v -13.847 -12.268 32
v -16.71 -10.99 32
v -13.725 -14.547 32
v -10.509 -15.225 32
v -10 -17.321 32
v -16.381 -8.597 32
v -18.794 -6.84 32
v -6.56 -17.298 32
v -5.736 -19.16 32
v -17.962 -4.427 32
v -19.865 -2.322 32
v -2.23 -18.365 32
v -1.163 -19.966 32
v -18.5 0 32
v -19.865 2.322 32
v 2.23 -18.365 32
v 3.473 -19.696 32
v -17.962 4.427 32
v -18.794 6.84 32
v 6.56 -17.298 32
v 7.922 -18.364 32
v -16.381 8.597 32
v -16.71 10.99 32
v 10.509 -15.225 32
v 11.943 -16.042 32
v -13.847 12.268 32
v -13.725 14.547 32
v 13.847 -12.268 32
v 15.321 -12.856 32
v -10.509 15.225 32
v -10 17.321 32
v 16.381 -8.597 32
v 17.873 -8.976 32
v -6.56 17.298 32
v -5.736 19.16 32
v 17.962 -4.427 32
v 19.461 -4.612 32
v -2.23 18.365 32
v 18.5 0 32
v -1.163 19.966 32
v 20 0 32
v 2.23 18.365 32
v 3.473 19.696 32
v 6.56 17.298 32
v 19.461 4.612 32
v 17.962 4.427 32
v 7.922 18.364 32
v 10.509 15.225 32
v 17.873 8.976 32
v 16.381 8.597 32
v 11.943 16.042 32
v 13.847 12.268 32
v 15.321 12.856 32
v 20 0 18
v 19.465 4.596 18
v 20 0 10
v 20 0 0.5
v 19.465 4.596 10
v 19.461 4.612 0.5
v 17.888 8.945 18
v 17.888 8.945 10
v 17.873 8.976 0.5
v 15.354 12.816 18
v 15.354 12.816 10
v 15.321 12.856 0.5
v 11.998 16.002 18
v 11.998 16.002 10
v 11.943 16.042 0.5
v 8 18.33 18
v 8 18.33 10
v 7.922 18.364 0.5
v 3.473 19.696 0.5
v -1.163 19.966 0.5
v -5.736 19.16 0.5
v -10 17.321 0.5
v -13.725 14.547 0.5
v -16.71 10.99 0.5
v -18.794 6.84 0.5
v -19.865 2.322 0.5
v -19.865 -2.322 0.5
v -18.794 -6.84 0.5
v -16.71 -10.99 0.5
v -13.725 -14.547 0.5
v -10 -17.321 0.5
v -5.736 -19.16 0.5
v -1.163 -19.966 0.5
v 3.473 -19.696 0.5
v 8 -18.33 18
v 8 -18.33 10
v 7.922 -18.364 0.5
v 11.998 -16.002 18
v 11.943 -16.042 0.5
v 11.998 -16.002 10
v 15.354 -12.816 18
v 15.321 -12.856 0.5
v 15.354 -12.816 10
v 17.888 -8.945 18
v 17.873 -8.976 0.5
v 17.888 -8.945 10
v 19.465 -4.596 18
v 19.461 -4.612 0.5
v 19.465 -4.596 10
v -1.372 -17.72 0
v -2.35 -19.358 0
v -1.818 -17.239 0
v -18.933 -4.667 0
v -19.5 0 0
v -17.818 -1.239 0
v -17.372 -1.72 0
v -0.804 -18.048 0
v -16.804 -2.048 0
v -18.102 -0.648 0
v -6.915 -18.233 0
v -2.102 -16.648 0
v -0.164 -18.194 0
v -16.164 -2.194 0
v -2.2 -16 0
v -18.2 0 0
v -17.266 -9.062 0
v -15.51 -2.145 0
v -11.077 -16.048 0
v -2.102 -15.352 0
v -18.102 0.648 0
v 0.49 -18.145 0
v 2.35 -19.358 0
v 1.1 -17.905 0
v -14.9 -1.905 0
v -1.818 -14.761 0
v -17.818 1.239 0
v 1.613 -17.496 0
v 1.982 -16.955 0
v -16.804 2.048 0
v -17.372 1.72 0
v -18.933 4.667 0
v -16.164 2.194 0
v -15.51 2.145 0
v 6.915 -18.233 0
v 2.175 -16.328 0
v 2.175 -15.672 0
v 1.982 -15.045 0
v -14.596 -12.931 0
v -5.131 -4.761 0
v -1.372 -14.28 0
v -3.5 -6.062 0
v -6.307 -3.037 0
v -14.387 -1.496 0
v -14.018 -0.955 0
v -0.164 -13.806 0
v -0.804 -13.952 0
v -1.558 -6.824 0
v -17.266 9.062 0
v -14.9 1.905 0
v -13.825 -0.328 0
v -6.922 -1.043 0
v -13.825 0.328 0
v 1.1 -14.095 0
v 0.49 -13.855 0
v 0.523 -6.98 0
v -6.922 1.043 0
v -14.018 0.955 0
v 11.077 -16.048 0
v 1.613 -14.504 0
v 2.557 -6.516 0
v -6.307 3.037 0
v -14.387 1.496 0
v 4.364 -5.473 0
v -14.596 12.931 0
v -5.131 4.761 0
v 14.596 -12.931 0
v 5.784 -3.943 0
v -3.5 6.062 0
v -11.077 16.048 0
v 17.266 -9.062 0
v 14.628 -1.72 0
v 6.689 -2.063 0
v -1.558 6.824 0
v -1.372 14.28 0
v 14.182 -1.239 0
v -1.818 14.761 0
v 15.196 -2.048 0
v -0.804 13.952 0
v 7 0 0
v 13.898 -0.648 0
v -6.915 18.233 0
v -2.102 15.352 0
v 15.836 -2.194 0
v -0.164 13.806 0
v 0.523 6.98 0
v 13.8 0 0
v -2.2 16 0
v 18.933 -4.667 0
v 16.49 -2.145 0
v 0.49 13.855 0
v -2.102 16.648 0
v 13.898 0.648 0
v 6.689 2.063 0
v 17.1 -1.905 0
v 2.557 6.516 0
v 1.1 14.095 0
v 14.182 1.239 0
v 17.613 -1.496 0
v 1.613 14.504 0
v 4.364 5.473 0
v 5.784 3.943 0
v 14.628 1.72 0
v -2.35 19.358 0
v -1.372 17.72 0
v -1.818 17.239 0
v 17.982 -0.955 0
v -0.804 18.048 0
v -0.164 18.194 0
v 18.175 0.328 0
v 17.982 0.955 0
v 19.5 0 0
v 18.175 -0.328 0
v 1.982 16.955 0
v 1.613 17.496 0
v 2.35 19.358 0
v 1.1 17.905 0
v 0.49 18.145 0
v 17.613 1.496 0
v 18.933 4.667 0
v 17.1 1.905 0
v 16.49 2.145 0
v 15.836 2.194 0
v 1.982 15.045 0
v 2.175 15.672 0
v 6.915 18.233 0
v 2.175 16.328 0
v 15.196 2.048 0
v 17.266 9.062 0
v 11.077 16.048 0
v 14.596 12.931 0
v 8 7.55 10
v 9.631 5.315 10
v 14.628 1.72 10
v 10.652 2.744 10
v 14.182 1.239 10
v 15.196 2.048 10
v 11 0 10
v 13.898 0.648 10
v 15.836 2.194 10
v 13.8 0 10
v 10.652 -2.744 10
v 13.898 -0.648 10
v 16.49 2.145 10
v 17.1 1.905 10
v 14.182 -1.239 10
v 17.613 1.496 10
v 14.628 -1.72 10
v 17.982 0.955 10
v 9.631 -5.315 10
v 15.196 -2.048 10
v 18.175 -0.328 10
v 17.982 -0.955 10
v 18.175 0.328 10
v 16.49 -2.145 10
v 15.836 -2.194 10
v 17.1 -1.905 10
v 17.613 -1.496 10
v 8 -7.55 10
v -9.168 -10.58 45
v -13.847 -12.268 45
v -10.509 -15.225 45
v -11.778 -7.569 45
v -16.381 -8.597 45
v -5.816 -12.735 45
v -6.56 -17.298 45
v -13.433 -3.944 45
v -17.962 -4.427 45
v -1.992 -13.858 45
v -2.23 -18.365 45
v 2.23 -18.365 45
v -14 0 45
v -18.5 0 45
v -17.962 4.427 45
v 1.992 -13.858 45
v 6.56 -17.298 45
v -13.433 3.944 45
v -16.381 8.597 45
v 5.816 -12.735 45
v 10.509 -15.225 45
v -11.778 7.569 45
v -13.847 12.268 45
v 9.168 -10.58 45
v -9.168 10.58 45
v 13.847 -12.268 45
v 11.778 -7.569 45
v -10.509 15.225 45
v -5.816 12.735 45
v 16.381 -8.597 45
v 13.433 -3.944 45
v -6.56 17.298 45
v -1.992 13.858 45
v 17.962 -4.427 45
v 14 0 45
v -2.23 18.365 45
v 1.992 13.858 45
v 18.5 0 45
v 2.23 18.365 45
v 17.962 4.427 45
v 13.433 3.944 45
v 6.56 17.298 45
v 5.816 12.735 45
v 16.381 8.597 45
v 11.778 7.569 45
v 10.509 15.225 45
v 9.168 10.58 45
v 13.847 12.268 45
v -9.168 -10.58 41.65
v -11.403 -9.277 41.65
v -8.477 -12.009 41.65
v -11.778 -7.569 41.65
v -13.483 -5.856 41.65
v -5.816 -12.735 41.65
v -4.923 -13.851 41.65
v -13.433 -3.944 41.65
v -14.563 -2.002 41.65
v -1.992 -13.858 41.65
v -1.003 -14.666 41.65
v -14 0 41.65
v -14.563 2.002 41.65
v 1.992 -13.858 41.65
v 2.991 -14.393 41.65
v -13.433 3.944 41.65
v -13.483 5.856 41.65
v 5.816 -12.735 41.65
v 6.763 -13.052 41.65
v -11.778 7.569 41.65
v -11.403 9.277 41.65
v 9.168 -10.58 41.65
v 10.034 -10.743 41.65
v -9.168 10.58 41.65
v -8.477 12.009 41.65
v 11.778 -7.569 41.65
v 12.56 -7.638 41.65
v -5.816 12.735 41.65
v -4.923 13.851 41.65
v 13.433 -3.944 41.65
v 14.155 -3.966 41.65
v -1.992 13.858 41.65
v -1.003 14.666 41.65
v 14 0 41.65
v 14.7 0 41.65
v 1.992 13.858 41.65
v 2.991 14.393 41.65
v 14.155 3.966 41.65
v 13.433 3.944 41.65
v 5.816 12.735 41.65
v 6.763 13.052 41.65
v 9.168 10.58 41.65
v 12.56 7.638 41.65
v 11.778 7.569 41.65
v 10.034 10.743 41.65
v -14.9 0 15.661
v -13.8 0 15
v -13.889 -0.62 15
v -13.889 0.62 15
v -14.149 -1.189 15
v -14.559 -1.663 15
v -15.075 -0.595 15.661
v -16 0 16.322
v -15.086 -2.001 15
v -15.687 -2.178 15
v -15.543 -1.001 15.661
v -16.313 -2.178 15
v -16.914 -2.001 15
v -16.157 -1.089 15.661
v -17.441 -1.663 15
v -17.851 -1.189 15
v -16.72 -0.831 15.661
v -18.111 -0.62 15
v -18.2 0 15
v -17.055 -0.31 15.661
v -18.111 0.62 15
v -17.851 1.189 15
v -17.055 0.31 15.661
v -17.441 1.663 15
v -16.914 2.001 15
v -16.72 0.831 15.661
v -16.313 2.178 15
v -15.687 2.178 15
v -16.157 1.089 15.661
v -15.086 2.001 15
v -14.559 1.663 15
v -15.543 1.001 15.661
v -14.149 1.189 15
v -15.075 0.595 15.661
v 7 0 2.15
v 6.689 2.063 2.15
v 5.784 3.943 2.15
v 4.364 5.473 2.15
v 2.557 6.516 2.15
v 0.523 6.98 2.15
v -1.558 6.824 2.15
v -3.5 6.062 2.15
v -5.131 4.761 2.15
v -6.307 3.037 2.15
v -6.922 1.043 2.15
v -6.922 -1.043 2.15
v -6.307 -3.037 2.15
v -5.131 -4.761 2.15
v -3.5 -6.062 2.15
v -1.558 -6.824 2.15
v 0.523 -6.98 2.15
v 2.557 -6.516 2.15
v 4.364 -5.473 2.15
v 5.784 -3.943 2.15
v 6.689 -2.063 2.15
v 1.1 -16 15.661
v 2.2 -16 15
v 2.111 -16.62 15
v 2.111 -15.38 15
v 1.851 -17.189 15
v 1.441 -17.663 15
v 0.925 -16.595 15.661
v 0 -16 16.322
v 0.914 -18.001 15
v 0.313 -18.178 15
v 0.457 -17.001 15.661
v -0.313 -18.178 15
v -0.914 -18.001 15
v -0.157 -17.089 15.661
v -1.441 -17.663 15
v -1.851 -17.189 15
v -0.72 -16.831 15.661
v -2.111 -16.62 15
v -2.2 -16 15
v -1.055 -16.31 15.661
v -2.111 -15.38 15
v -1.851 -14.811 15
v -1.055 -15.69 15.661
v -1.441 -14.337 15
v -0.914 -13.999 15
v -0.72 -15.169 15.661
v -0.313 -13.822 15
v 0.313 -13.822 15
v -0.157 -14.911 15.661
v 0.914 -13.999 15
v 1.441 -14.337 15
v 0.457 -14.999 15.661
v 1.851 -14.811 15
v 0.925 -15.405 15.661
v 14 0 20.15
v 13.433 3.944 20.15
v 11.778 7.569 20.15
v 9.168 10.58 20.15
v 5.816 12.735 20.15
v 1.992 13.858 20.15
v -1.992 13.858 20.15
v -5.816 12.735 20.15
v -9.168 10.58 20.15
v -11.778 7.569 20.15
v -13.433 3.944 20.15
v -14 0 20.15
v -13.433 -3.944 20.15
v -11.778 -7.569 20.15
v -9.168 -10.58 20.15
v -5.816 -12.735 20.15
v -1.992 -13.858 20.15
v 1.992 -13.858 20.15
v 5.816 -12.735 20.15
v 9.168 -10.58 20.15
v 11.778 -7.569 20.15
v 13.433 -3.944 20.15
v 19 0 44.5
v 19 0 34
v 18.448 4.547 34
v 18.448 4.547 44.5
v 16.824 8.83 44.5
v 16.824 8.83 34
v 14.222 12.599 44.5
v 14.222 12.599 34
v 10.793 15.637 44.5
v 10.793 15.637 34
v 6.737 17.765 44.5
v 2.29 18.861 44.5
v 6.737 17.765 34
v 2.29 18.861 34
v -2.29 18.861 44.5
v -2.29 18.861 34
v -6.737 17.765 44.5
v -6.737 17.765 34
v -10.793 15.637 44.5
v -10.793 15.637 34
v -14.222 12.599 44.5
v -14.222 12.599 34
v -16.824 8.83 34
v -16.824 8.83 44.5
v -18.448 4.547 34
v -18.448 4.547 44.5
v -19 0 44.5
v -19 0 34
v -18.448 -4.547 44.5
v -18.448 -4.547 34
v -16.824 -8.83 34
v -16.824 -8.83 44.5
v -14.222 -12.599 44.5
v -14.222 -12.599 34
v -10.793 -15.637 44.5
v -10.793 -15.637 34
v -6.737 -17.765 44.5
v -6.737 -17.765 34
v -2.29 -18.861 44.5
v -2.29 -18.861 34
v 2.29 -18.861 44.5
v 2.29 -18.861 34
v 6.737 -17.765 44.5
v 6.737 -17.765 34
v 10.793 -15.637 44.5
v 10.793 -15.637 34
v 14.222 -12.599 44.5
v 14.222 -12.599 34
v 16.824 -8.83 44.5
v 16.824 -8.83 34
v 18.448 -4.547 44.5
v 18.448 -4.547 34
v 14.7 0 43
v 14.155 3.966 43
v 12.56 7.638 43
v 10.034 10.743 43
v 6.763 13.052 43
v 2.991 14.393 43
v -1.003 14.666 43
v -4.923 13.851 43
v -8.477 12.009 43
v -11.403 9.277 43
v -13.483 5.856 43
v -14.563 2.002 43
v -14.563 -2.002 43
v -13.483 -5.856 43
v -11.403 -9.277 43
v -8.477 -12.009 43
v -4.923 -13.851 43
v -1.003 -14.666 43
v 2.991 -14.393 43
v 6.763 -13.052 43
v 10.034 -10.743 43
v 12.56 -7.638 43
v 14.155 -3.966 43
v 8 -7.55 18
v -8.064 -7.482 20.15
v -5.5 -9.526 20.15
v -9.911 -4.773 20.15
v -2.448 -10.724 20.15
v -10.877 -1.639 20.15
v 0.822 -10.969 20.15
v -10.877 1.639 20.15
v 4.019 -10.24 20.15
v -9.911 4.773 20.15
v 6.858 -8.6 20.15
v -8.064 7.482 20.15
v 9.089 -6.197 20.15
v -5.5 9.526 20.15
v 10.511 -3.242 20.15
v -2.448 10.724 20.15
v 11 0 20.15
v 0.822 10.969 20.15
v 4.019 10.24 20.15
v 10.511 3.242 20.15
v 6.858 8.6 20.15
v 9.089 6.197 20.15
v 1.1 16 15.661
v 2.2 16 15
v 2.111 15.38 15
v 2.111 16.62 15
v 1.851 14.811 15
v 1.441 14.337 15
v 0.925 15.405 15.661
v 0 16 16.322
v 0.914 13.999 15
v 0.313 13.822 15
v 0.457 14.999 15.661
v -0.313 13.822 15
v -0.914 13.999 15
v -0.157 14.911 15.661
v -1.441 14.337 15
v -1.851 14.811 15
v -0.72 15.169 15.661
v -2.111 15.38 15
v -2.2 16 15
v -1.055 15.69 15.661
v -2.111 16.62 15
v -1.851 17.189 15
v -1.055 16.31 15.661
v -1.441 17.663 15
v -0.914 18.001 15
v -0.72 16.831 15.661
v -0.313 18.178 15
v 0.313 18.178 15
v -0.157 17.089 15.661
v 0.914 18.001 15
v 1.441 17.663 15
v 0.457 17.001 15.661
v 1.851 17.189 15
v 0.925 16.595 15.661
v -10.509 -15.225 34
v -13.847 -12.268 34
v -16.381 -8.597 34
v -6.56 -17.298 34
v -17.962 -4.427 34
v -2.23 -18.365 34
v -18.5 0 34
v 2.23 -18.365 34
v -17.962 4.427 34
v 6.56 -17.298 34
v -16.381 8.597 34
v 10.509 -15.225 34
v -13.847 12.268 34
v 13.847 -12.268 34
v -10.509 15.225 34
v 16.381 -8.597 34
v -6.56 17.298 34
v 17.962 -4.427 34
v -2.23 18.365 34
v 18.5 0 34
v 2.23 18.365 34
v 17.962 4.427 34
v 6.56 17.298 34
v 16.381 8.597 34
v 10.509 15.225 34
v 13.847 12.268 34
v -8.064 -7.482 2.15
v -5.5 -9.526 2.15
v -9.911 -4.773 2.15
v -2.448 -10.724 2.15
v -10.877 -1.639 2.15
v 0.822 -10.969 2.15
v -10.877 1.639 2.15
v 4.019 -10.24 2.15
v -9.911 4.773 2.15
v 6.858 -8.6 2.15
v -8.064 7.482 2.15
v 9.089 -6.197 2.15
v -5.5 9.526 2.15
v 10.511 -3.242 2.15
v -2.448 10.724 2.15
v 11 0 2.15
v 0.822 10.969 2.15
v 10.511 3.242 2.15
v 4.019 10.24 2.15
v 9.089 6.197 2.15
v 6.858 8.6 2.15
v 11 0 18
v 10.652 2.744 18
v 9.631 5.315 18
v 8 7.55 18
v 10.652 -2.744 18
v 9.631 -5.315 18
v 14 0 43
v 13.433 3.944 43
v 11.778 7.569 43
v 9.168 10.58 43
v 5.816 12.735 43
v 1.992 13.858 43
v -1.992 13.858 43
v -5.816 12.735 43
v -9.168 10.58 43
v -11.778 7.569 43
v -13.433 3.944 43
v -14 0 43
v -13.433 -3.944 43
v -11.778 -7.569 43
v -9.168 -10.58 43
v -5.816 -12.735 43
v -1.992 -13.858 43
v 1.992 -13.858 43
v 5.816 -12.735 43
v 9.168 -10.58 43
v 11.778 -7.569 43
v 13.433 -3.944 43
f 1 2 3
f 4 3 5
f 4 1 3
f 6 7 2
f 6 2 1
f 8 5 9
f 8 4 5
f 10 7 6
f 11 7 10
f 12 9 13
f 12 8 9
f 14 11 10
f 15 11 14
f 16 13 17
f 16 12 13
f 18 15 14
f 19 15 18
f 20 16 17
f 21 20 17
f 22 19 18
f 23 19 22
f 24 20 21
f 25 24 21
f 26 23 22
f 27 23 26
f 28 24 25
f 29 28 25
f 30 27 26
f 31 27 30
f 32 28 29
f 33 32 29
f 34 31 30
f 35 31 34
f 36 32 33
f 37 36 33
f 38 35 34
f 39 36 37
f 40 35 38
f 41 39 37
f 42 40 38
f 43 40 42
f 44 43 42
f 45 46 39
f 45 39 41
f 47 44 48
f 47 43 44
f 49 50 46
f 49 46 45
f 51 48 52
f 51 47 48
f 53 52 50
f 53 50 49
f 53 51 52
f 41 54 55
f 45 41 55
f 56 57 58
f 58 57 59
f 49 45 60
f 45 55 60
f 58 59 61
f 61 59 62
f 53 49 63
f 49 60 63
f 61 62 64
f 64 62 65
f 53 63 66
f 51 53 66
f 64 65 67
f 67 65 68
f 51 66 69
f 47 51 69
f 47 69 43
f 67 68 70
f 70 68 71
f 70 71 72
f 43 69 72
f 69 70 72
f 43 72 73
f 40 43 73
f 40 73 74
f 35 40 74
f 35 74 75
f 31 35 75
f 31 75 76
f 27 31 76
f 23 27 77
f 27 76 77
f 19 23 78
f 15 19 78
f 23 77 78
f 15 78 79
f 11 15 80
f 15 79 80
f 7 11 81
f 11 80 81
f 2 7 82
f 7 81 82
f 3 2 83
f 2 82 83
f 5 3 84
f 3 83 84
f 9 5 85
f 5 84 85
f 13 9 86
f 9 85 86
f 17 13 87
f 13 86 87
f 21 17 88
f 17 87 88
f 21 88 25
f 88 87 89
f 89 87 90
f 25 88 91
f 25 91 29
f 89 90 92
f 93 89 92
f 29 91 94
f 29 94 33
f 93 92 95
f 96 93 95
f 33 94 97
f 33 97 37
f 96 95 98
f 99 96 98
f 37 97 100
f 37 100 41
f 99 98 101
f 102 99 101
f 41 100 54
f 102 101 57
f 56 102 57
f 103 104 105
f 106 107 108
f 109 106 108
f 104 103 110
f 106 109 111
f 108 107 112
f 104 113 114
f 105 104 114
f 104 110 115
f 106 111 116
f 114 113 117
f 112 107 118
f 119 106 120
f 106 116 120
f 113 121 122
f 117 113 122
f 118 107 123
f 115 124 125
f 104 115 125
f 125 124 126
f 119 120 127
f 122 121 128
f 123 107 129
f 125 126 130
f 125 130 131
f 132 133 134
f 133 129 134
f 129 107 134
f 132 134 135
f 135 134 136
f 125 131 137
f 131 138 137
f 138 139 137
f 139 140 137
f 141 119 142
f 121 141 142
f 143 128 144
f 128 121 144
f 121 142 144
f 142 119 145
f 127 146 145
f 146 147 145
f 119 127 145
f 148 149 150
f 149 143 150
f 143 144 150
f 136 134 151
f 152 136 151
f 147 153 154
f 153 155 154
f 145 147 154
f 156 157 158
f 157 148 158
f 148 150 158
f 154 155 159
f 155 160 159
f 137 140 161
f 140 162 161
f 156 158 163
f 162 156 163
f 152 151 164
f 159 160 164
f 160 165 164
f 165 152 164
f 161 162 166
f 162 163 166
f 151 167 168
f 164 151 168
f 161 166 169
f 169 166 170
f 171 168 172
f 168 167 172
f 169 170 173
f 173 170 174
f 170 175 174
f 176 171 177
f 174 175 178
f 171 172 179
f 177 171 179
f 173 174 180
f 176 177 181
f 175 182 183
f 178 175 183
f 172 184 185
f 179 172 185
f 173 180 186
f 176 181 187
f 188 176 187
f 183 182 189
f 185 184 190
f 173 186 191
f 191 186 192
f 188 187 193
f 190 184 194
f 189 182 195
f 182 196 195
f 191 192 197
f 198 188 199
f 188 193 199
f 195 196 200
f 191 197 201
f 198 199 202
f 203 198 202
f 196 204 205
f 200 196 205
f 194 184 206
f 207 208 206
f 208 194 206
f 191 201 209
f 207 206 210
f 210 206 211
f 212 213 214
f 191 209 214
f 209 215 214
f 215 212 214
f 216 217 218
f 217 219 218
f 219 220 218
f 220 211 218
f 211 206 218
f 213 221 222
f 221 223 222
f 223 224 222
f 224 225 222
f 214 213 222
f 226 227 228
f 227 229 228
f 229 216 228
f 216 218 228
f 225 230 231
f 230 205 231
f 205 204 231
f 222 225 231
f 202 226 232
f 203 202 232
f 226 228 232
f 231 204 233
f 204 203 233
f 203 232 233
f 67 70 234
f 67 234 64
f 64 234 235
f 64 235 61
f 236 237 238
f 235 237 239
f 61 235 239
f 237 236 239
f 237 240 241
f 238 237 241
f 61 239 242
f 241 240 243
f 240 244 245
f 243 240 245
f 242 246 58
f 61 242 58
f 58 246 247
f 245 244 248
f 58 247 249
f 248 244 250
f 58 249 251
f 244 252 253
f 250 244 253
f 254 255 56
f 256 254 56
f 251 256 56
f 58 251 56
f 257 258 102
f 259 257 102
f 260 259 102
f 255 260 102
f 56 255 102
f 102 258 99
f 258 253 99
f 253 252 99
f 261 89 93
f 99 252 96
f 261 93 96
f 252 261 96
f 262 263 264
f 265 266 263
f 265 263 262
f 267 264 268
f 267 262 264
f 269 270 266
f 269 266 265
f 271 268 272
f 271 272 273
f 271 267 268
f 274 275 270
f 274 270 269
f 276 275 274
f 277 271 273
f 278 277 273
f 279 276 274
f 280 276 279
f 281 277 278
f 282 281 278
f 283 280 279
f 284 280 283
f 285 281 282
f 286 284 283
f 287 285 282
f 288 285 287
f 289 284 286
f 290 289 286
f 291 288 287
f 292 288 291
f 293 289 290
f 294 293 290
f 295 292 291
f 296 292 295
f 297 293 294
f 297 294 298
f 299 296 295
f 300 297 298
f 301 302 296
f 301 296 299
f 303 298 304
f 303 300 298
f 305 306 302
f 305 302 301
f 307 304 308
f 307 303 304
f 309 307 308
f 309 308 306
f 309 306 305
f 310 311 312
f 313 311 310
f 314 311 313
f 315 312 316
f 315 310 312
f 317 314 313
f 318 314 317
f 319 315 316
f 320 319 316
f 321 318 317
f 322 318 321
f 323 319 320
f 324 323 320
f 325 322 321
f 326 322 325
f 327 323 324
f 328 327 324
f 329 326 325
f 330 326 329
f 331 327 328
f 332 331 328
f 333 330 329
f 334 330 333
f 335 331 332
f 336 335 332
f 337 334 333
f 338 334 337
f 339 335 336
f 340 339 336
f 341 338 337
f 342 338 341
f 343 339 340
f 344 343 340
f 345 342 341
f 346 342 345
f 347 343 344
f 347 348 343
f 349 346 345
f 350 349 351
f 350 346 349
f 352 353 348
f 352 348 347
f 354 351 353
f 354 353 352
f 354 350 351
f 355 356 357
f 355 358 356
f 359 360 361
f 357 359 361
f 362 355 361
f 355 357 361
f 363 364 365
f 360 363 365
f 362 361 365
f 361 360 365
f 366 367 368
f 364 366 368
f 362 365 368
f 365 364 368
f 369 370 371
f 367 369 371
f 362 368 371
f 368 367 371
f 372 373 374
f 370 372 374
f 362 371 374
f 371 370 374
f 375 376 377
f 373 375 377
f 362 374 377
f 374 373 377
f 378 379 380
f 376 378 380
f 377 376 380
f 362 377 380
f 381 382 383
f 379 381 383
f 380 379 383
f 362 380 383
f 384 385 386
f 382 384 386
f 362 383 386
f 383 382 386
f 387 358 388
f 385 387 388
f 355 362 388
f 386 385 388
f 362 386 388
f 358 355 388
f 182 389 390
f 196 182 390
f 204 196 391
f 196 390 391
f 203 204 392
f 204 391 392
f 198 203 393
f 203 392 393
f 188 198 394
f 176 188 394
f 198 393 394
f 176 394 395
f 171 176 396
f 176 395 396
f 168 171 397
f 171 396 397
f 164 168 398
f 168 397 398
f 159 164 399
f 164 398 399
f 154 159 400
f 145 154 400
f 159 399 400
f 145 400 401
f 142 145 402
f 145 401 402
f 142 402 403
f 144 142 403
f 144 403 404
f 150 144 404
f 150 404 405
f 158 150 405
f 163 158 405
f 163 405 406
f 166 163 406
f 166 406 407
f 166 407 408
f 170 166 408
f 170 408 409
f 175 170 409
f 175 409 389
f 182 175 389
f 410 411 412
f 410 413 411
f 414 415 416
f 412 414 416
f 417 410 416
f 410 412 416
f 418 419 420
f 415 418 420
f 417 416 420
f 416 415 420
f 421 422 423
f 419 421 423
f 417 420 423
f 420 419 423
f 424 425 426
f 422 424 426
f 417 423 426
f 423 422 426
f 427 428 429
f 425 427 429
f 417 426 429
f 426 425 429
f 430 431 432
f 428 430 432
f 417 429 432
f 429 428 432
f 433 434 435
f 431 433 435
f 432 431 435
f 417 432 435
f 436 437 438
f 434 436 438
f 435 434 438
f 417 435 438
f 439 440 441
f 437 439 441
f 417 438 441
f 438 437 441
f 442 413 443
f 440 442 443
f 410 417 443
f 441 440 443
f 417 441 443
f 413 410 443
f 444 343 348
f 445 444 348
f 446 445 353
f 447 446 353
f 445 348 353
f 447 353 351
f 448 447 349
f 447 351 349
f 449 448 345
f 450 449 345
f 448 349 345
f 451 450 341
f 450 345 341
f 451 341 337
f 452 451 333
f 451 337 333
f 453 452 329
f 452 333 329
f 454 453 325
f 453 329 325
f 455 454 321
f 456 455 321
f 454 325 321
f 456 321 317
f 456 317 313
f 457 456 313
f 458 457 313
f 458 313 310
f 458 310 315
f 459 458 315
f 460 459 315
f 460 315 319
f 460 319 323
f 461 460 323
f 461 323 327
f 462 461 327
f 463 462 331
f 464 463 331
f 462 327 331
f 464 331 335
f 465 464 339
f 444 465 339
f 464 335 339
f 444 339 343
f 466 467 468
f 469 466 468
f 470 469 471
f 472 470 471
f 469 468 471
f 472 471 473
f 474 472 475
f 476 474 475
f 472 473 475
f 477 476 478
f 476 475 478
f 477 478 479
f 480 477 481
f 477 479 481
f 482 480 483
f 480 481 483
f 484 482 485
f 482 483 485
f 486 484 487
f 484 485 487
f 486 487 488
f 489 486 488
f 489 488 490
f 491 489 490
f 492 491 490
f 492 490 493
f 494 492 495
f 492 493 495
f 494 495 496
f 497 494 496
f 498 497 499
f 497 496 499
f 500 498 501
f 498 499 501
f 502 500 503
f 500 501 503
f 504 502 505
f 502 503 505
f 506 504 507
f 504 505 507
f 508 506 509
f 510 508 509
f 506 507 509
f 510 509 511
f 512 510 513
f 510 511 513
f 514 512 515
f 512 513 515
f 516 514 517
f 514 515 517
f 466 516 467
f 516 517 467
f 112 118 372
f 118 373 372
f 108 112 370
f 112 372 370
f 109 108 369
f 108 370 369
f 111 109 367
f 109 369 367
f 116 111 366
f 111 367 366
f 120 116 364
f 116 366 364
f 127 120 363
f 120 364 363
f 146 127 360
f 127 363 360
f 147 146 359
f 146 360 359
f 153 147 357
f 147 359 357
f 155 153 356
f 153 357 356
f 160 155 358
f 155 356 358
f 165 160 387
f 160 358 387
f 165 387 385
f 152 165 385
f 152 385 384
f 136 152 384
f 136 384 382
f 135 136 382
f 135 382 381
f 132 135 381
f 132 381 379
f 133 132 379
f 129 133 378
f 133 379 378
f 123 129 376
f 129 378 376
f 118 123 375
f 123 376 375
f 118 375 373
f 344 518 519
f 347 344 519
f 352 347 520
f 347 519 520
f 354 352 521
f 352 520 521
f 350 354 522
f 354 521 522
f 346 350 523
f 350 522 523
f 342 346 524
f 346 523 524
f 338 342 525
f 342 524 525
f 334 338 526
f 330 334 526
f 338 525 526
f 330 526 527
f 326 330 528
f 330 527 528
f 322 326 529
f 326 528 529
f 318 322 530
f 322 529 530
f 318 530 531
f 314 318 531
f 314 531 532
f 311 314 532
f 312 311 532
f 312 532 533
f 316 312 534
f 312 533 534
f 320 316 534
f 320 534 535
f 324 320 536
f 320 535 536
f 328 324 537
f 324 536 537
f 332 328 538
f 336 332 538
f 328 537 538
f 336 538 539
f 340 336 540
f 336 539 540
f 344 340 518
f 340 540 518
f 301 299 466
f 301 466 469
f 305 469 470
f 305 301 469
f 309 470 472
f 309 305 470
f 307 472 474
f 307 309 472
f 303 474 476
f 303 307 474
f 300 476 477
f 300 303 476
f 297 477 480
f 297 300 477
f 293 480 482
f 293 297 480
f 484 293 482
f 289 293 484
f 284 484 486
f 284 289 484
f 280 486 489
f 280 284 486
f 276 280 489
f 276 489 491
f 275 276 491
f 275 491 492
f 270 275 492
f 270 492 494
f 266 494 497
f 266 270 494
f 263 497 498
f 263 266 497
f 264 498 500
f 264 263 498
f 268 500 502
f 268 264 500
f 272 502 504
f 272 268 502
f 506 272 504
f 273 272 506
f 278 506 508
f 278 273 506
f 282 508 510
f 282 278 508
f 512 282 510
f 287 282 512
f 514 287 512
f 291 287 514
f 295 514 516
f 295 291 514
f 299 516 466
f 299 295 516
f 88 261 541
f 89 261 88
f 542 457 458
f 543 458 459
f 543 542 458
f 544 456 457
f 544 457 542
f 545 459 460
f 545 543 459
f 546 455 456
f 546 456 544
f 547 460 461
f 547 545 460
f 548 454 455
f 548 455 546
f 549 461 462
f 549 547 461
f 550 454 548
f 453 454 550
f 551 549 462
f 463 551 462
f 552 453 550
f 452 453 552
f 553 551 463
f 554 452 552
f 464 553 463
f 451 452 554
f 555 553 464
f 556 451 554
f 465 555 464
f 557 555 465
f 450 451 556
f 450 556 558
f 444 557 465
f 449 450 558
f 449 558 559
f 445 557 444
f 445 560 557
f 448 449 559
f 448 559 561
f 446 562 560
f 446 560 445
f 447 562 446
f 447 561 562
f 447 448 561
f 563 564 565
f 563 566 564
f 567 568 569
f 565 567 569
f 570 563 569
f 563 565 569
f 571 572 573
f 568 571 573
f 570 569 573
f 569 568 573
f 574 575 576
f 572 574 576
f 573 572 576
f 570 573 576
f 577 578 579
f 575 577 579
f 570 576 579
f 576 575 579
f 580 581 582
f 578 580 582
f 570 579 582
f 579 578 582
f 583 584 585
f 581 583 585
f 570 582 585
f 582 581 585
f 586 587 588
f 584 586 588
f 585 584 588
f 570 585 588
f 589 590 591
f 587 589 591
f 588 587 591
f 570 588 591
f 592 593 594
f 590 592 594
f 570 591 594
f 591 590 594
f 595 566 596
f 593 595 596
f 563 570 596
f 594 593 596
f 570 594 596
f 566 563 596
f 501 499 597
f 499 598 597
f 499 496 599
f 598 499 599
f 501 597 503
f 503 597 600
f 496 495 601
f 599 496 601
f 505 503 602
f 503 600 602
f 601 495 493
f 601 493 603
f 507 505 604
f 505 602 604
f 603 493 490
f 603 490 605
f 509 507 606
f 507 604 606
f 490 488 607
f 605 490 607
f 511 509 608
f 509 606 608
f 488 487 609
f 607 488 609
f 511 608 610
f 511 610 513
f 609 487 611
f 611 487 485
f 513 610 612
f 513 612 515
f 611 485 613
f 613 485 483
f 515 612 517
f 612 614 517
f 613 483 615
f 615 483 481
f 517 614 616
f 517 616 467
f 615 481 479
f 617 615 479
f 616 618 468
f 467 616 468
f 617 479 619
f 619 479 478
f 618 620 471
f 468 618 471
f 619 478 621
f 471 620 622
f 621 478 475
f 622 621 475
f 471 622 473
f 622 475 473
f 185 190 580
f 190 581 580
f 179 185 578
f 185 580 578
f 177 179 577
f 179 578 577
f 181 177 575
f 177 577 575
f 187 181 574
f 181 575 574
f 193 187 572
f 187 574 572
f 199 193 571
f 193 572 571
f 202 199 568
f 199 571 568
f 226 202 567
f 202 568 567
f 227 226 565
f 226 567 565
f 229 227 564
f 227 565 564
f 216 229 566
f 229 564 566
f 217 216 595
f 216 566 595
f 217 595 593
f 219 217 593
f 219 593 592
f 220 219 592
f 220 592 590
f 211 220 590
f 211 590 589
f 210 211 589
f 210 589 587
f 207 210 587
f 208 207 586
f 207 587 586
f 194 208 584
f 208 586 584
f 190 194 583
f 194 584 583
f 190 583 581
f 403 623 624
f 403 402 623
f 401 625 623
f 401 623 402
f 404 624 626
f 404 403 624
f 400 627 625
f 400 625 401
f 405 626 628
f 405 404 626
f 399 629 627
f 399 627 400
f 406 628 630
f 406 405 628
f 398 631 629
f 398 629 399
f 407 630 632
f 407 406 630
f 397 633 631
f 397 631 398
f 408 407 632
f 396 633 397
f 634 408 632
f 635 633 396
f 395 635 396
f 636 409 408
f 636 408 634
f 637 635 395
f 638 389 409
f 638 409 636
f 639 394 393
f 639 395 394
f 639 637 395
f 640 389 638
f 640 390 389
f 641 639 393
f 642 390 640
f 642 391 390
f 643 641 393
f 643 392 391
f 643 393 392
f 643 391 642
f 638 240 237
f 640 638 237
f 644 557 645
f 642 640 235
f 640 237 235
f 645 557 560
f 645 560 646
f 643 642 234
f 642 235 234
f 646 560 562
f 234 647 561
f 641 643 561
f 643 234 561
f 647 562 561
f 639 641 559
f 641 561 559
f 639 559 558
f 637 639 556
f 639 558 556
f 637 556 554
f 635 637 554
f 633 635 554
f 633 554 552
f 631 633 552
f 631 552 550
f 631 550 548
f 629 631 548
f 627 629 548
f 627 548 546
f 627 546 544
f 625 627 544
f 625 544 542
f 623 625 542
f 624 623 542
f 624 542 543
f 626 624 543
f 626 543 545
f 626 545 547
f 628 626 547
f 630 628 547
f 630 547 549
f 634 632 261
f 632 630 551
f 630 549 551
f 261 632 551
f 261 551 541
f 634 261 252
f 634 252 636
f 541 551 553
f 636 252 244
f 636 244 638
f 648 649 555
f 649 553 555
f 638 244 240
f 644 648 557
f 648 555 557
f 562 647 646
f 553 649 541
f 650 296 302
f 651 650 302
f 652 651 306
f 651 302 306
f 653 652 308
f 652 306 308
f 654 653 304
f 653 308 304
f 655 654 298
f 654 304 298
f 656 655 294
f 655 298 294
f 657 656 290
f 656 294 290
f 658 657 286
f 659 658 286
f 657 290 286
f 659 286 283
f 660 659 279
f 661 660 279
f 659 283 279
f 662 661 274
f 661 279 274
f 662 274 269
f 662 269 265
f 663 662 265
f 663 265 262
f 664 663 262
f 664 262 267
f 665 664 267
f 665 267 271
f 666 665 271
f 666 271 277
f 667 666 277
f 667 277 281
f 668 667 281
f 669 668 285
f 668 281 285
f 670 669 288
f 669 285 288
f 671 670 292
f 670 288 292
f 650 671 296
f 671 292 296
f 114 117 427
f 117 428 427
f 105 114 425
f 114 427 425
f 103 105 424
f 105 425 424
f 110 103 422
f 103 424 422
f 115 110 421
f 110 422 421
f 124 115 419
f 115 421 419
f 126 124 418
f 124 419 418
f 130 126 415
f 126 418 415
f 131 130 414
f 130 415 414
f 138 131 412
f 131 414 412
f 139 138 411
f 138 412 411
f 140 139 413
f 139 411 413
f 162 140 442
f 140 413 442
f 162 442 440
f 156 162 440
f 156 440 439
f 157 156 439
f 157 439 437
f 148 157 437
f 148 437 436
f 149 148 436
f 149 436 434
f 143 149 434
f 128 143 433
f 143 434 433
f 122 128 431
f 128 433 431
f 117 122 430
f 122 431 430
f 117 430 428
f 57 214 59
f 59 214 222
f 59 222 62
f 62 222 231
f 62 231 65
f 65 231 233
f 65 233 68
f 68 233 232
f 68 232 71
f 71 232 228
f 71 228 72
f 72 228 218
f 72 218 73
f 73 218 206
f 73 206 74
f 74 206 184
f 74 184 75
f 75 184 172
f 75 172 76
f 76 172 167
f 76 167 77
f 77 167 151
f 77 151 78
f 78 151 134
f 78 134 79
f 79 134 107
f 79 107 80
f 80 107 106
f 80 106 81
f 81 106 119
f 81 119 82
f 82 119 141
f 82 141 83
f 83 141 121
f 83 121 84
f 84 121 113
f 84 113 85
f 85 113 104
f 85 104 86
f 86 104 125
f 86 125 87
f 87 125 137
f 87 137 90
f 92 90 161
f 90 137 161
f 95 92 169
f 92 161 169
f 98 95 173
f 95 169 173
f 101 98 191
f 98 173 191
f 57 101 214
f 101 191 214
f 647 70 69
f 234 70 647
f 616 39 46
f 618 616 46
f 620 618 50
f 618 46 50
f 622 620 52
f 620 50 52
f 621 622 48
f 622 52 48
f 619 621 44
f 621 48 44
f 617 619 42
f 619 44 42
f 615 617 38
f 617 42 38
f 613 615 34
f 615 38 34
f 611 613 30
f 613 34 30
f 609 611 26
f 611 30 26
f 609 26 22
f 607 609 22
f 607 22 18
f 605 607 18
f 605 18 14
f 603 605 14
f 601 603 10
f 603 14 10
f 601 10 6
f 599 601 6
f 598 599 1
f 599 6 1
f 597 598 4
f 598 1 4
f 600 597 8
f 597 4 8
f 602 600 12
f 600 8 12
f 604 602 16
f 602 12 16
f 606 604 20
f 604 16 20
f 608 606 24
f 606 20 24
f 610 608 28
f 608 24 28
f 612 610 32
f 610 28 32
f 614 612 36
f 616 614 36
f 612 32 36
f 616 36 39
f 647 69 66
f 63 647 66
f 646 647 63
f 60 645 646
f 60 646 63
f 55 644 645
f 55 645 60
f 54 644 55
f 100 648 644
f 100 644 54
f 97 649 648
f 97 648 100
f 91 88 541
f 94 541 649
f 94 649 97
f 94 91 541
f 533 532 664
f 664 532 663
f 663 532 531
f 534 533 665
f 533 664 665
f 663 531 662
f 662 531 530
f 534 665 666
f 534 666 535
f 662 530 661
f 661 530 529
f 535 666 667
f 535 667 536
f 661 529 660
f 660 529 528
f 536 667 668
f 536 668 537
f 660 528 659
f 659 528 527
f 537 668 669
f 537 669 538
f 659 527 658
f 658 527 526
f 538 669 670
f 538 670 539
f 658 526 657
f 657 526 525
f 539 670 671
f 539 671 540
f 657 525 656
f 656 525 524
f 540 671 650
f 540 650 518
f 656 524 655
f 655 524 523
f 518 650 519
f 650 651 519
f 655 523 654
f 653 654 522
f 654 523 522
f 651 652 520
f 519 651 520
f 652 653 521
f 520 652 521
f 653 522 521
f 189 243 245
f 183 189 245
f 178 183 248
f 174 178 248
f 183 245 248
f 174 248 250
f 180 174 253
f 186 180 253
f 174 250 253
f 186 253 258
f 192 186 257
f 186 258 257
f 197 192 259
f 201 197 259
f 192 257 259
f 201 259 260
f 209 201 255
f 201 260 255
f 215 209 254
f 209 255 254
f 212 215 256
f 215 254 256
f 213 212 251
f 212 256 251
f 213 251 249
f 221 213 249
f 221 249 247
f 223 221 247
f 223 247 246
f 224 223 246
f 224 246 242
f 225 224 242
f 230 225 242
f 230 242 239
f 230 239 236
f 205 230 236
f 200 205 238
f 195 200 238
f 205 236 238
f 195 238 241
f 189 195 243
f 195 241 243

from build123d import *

# Parameters (mm, degrees)
F0_R      = 20
F1_DEPTH  = 32
F2_R      = 18.5
F3_DEPTH  = 2
F4_R      = 19
F5_DEPTH  = 11
F6_R      = 14
F7_DEPTH  = 2
F8_R      = 14.7
F9_DEPTH  = 1.35
F10_R     = 14
F11_DEPTH = 21.5
F12_R     = 11
F13_DEPTH = 18
F14_R     = 7
F15_DEPTH = 25
F17_D     = 4.4
F17_DEPTH = 15
F17_TIP   = 1.3218933619
F19_START = -10
F18_W     = 20
F18_H     = 43.6686427468
F19_DEPTH = 8
F20_SIZE  = 0.5


with BuildPart() as f1:
    # F0 (on Top) → F1 (new body)
    with BuildSketch(Plane.XY):
        Circle(F0_R)
    extrude(amount=F1_DEPTH)

    # F2 (on face) → F3 (join)
    with BuildSketch(Plane.XY.offset(32)):
        Circle(F2_R)
    extrude(amount=F3_DEPTH)

    # F4 (on face) → F5 (join)
    with BuildSketch(Plane.XY.offset(34)):
        Circle(F4_R)
    extrude(amount=F5_DEPTH)

    # F6 (on face) → F7 (cut)
    with BuildSketch(Plane.XY.offset(45)):
        Circle(F6_R)
    extrude(amount=-F7_DEPTH, mode=Mode.SUBTRACT)

    # F8 (on face) → F9 (cut)
    with BuildSketch(Plane.XY.offset(43)):
        Circle(F8_R)
    extrude(amount=-F9_DEPTH, mode=Mode.SUBTRACT)

    # F10 (on face) → F11 (cut)
    with BuildSketch(Plane.XY.offset(41.65)):
        Circle(F10_R)
    extrude(amount=-F11_DEPTH, mode=Mode.SUBTRACT)

    # F12 (on face) → F13 (cut)
    with BuildSketch(Plane.XY.offset(20.15)):
        Circle(F12_R)
    extrude(amount=-F13_DEPTH, mode=Mode.SUBTRACT)

    # F14 (on face) → F15 (cut)
    with BuildSketch(Plane.XY.offset(2.15)):
        Circle(F14_R)
    extrude(amount=-F15_DEPTH, mode=Mode.SUBTRACT)

    # F17
    with Locations(Plane(origin=(0, 0, 0), x_dir=(1, 0, 0), z_dir=(0, 0, -1))):
        with Locations((-16, 0), (0, 16), (16, 0), (0, -16)):
            Hole(F17_D / 2, depth=F17_DEPTH)
            with Locations((0, 0, -(F17_DEPTH + F17_TIP / 2))):  # 118° drill point
                Cone(0, F17_D / 2, F17_TIP, mode=Mode.SUBTRACT)

    # F18 (on face) → F19 (cut)
    with BuildSketch(Plane(origin=(0, 0, 0), x_dir=(1, 0, 0), z_dir=(0, 0, -1)).offset(F19_START)):
        with Locations((18, -0.2762433141)):
            Rectangle(F18_W, F18_H)
    extrude(amount=-F19_DEPTH, mode=Mode.SUBTRACT)

    # F20
    f20_edges = [f1.edges().sort_by_distance(p)[0] for p in [
        (-20, 0, 0),
        (-19, 0, 45),
    ]]
    chamfer(f20_edges, length=F20_SIZE)


solid = f1.part
